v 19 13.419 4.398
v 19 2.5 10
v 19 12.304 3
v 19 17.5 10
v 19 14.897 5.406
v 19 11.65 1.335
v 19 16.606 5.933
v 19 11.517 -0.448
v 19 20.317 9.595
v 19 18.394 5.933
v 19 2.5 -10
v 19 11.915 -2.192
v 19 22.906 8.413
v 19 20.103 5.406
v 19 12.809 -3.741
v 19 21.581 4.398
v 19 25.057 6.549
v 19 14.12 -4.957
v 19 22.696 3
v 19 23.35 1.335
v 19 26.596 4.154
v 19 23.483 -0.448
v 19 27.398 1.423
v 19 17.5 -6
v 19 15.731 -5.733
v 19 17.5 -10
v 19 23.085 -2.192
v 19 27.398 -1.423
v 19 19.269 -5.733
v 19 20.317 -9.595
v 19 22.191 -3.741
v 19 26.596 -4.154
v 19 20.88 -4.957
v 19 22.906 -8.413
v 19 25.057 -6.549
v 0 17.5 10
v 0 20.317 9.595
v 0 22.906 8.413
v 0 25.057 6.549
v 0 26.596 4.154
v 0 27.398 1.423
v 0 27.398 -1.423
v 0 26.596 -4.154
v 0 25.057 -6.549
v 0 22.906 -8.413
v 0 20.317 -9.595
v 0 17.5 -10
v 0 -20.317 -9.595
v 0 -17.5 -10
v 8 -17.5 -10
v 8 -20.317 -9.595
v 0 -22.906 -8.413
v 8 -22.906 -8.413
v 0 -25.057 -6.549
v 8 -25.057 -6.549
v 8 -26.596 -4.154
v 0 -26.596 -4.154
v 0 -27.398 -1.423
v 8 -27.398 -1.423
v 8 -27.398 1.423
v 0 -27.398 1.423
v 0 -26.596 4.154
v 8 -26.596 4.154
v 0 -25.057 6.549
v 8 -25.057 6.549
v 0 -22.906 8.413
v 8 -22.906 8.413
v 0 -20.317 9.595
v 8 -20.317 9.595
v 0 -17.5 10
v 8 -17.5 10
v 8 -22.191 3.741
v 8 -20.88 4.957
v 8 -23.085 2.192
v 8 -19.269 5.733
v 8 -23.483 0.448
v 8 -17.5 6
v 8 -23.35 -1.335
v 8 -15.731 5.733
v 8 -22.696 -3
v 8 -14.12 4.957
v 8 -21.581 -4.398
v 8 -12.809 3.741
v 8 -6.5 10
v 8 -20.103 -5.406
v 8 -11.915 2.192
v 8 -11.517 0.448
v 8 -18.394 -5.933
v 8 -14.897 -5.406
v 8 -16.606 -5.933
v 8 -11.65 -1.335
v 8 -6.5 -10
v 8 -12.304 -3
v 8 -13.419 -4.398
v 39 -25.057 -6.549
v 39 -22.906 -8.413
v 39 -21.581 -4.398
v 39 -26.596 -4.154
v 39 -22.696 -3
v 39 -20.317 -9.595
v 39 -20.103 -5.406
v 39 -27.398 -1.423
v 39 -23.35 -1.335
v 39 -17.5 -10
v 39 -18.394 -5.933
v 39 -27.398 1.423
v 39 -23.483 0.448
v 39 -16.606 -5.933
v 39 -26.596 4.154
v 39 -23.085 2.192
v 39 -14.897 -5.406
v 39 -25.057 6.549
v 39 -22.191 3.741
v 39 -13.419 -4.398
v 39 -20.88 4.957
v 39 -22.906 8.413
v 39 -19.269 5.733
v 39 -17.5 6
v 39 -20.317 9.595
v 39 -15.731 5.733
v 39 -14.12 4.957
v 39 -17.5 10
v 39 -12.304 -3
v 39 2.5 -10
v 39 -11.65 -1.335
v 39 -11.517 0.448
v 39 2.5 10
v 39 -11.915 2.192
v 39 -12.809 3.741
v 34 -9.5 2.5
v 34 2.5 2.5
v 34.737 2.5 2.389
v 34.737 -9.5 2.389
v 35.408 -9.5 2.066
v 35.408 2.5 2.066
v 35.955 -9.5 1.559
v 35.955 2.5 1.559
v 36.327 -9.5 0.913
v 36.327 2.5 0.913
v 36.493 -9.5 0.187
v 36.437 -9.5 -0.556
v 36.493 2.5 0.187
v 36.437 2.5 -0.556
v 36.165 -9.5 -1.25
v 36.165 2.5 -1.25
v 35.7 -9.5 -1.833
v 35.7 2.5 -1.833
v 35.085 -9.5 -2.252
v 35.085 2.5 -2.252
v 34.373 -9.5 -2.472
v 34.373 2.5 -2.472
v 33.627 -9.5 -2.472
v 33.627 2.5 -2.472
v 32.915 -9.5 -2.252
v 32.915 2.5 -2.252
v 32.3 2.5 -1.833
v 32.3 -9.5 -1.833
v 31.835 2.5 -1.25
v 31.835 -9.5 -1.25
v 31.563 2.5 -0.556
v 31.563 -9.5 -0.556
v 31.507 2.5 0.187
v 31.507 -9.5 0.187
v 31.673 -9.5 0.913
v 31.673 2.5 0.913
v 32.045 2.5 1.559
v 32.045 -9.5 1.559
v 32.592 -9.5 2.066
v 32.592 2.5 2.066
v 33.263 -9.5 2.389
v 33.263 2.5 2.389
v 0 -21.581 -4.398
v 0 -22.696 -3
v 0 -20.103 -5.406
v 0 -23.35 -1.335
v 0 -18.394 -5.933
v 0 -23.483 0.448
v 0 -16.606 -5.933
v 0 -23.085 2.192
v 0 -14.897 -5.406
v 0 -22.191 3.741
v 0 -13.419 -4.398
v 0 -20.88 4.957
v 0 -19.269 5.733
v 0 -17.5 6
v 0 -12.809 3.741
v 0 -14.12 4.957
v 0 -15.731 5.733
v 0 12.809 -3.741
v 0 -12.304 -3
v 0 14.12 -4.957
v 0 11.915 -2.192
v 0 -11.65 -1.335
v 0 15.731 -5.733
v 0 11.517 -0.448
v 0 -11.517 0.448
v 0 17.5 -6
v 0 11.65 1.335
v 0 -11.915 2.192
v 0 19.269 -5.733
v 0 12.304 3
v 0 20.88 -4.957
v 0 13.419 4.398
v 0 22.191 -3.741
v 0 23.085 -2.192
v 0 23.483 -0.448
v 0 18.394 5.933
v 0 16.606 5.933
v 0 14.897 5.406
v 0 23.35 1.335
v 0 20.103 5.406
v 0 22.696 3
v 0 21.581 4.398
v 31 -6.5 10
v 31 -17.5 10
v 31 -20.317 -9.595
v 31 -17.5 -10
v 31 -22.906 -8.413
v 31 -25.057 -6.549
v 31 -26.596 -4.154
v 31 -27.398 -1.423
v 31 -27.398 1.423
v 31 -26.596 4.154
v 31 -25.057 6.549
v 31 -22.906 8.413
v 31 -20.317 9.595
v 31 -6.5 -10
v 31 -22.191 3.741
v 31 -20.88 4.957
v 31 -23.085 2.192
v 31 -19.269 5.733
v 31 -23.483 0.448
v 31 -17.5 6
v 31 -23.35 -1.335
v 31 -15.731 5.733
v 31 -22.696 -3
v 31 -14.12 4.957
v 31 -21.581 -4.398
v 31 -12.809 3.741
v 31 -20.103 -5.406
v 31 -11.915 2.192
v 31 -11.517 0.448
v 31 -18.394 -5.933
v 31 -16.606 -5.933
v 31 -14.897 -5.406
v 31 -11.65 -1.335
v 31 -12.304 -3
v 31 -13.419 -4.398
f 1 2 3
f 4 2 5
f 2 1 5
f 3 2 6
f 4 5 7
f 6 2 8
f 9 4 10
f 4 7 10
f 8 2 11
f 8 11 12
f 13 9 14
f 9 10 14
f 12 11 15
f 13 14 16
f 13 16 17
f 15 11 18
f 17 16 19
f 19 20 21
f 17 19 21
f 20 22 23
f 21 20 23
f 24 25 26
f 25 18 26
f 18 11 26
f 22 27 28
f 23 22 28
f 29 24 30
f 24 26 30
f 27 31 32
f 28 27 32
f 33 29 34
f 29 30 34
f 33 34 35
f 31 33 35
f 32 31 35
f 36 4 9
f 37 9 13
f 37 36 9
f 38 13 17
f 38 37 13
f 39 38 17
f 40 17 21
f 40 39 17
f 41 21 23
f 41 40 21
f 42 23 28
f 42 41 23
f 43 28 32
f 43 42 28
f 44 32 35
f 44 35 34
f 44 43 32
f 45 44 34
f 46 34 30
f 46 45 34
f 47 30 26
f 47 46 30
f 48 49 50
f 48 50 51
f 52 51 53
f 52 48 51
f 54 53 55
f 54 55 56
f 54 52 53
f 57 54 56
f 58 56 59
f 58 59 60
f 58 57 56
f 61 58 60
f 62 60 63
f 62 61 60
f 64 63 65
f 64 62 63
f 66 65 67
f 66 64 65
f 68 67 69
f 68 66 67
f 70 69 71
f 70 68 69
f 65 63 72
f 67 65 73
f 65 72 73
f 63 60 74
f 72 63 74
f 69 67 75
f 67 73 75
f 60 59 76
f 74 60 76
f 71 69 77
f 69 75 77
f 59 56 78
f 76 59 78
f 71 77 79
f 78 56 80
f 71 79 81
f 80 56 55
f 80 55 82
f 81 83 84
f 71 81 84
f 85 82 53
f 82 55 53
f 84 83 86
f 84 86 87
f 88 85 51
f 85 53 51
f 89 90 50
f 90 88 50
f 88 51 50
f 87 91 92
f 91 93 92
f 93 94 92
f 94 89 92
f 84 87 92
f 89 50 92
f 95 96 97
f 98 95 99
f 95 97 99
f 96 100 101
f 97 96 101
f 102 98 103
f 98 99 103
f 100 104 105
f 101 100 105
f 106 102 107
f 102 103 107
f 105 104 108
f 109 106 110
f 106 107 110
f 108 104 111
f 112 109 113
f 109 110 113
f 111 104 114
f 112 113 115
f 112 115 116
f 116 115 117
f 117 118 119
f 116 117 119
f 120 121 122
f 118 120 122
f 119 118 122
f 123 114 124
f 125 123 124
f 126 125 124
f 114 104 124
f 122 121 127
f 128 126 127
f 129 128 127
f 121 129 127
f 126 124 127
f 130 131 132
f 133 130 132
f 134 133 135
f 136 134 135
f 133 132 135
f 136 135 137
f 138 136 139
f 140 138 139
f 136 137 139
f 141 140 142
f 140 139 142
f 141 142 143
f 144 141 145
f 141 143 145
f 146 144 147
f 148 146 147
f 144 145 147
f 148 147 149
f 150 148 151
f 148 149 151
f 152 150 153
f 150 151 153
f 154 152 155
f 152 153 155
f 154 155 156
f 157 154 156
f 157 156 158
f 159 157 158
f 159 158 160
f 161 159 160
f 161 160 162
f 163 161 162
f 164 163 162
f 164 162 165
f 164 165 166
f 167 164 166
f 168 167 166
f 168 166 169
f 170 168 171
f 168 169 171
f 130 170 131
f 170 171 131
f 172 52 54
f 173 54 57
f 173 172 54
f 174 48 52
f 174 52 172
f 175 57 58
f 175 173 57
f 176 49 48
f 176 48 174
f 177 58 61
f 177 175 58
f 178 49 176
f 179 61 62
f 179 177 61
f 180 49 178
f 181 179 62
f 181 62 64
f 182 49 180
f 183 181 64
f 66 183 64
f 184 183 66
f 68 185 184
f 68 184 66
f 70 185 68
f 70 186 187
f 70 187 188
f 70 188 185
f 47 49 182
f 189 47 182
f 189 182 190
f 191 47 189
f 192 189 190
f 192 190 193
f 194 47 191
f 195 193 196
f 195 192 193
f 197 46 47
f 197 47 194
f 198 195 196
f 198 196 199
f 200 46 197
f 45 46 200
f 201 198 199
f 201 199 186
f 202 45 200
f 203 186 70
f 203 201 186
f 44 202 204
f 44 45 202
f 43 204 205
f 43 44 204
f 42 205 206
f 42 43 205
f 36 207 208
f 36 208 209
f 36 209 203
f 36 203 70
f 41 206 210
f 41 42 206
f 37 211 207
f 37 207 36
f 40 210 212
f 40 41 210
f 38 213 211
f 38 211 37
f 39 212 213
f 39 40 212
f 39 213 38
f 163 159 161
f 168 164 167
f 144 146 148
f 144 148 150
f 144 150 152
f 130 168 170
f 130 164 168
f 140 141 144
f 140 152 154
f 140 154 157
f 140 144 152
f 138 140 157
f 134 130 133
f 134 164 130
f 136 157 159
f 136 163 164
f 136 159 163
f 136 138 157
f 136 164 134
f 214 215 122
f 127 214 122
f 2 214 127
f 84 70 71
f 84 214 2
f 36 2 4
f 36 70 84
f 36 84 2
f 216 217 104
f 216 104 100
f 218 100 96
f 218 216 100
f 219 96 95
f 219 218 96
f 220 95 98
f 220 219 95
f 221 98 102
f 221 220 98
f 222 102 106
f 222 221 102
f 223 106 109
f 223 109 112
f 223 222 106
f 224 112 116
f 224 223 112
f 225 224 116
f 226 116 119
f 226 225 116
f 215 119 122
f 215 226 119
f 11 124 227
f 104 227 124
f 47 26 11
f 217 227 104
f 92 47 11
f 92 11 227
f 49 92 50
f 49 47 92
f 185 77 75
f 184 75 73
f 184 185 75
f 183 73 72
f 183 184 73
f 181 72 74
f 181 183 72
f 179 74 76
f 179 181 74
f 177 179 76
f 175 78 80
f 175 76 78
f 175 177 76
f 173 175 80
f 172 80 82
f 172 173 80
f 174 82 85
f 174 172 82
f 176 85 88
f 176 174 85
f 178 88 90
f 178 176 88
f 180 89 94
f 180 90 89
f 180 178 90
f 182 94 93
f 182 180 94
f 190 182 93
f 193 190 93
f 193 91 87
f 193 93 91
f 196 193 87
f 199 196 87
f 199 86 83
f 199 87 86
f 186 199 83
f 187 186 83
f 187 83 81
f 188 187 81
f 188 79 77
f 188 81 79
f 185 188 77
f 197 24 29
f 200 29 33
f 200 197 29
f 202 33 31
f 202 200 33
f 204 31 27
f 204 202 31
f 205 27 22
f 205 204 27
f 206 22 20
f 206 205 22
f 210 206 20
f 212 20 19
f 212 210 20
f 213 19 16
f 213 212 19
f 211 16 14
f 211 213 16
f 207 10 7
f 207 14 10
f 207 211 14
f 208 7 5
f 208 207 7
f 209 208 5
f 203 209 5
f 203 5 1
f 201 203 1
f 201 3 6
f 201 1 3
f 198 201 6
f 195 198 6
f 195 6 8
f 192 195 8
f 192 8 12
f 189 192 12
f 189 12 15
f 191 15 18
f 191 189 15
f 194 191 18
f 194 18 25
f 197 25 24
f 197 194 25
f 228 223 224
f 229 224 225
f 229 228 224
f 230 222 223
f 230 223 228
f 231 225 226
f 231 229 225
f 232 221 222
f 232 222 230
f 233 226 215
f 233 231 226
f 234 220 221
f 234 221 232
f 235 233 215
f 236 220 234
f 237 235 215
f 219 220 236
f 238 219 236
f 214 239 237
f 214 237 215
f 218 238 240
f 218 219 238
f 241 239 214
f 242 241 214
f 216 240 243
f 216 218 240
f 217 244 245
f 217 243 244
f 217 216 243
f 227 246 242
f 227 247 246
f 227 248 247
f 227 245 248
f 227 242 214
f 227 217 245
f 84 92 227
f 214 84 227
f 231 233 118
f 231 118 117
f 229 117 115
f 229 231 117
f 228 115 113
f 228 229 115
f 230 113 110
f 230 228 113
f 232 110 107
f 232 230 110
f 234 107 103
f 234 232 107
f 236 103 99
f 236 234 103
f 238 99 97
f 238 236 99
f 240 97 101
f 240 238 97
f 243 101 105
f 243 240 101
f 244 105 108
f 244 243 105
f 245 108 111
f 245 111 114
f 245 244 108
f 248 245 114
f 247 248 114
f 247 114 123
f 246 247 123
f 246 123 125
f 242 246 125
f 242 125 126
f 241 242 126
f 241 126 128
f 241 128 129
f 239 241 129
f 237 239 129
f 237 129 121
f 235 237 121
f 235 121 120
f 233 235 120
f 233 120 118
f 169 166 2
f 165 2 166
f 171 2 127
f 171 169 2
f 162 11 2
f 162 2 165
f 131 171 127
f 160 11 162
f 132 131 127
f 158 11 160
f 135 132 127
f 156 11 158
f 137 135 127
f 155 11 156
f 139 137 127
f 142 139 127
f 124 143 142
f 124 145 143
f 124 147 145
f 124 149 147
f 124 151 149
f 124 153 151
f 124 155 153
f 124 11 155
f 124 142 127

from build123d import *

# Parameters (mm, degrees)
SKETCH_1_R               = 6
EXTRUDE_1_DEPTH          = 39
CUT_EXTRUDE_1_DEPTH      = 49.757050772
CUT_EXTRUDE_1_DEPTH_BACK = 49.757050772
SKETCH_2_W               = 23
SKETCH_2_H               = 34.092407746
CUT_EXTRUDE_2_DEPTH      = 49.757050772
CUT_EXTRUDE_2_DEPTH_BACK = 49.757050772
SKETCH_3_W               = 43.713213687
SKETCH_3_H               = 32.597275916
SKETCH_4_R               = 2.5
CUT_EXTRUDE_3_DEPTH      = 12


with BuildPart() as part:
    # Эскиз1 → Бобышка-Вытянуть1 (new body)
    with BuildSketch(Plane(origin=(0, 0, 0), x_dir=(0, 0, -1), z_dir=(1, 0, 0))):
        with BuildLine():
            Line((10, 17.5), (10, -17.5))
            ThreePointArc((10, -17.5), (0, -27.5), (-10, -17.5))
            Line((-10, -17.5), (-10, 17.5))
            ThreePointArc((-10, 17.5), (0, 27.5), (10, 17.5))
        make_face()
        with Locations((0, 17.5)):
            Circle(SKETCH_1_R, mode=Mode.SUBTRACT)
        with Locations(Location((0, -17.5, 0), (0, 0, 180))):
            Circle(SKETCH_1_R, mode=Mode.SUBTRACT)
    extrude(amount=EXTRUDE_1_DEPTH)

    # Эскиз2 → Вырез-Вытянуть1 (cut, two sides: drawn at the far end of the back side and taken through both)
    with BuildSketch(Plane.XY.offset(-CUT_EXTRUDE_1_DEPTH_BACK)):
        with Locations((19.5, -23.546203873)):
            Rectangle(SKETCH_2_W, SKETCH_2_H)
    extrude(amount=CUT_EXTRUDE_1_DEPTH + CUT_EXTRUDE_1_DEPTH_BACK, mode=Mode.SUBTRACT)

    # Эскиз3 → Вырез-Вытянуть2 (cut, two sides: drawn at the far end of the back side and taken through both)
    with BuildSketch(Plane.XY.offset(-CUT_EXTRUDE_2_DEPTH_BACK)):
        with Locations((40.856606844, 18.798637958)):
            Rectangle(SKETCH_3_W, SKETCH_3_H)
    extrude(amount=CUT_EXTRUDE_2_DEPTH + CUT_EXTRUDE_2_DEPTH_BACK, mode=Mode.SUBTRACT)

    # Эскиз4 → Вырез-Вытянуть3 (cut)
    with BuildSketch(Plane(origin=(0, 2.5, 0), x_dir=(1, 0, 0), z_dir=(0, 1, 0))):
        with Locations(Location((34, 0, 0), (0, 0, 270))):
            Circle(SKETCH_4_R)
    extrude(amount=-CUT_EXTRUDE_3_DEPTH, mode=Mode.SUBTRACT)


solid = part.part
